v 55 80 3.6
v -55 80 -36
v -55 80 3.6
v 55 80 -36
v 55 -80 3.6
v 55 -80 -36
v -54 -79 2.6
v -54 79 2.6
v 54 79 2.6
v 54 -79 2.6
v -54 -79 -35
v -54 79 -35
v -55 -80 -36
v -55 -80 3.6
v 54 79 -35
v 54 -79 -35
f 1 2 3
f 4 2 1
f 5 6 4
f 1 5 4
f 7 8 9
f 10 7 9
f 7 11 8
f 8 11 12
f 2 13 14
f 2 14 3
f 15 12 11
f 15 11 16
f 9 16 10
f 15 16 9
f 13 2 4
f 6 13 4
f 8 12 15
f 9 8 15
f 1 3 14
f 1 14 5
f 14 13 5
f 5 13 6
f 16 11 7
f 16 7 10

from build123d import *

# Parameters (mm, degrees)
ESTRUSIONE_ESTRUSIONE2_DEPTH      = 3.6
ESTRUSIONE_ESTRUSIONE2_DEPTH_BACK = 36
SCHIZZO1_W                        = 110
SCHIZZO1_H                        = 160
SVUOTA3_T                         = -1
ESTRUSIONE_ESTRUSIONE3_REACH      = 106.475
SCHIZZO32_W                       = 110
SCHIZZO32_H                       = 1


with BuildPart() as part:
    # Schizzo1 → Estrusione-Estrusione2 (new, two sides: drawn at the far end of the back side and taken through both)
    with BuildSketch(Plane.XY.offset(-ESTRUSIONE_ESTRUSIONE2_DEPTH_BACK)):
        Rectangle(SCHIZZO1_W, SCHIZZO1_H)
    extrude(amount=ESTRUSIONE_ESTRUSIONE2_DEPTH + ESTRUSIONE_ESTRUSIONE2_DEPTH_BACK)

    # Svuota3
    svuota3_openings = [part.faces().sort_by_distance(p)[0] for p in [
        (0, 80, -16.2),
    ]]
    offset(amount=SVUOTA3_T, openings=svuota3_openings, kind=Kind.INTERSECTION)

    # Schizzo32 → Estrusione-Estrusione3 (add, up to next)
    with BuildSketch(Plane.XY.offset(-35), mode=Mode.PRIVATE) as estrusione_estrusione3_sk1:
        with Locations((0, 79.5)):
            Rectangle(SCHIZZO32_W, SCHIZZO32_H)
    estrusione_estrusione3_tool1 = extrude(estrusione_estrusione3_sk1.sketch, amount=ESTRUSIONE_ESTRUSIONE3_REACH, mode=Mode.PRIVATE) - part.part
    add(estrusione_estrusione3_tool1.solids().sort_by_distance((0, 79.5, -35))[0])


solid = part.part
